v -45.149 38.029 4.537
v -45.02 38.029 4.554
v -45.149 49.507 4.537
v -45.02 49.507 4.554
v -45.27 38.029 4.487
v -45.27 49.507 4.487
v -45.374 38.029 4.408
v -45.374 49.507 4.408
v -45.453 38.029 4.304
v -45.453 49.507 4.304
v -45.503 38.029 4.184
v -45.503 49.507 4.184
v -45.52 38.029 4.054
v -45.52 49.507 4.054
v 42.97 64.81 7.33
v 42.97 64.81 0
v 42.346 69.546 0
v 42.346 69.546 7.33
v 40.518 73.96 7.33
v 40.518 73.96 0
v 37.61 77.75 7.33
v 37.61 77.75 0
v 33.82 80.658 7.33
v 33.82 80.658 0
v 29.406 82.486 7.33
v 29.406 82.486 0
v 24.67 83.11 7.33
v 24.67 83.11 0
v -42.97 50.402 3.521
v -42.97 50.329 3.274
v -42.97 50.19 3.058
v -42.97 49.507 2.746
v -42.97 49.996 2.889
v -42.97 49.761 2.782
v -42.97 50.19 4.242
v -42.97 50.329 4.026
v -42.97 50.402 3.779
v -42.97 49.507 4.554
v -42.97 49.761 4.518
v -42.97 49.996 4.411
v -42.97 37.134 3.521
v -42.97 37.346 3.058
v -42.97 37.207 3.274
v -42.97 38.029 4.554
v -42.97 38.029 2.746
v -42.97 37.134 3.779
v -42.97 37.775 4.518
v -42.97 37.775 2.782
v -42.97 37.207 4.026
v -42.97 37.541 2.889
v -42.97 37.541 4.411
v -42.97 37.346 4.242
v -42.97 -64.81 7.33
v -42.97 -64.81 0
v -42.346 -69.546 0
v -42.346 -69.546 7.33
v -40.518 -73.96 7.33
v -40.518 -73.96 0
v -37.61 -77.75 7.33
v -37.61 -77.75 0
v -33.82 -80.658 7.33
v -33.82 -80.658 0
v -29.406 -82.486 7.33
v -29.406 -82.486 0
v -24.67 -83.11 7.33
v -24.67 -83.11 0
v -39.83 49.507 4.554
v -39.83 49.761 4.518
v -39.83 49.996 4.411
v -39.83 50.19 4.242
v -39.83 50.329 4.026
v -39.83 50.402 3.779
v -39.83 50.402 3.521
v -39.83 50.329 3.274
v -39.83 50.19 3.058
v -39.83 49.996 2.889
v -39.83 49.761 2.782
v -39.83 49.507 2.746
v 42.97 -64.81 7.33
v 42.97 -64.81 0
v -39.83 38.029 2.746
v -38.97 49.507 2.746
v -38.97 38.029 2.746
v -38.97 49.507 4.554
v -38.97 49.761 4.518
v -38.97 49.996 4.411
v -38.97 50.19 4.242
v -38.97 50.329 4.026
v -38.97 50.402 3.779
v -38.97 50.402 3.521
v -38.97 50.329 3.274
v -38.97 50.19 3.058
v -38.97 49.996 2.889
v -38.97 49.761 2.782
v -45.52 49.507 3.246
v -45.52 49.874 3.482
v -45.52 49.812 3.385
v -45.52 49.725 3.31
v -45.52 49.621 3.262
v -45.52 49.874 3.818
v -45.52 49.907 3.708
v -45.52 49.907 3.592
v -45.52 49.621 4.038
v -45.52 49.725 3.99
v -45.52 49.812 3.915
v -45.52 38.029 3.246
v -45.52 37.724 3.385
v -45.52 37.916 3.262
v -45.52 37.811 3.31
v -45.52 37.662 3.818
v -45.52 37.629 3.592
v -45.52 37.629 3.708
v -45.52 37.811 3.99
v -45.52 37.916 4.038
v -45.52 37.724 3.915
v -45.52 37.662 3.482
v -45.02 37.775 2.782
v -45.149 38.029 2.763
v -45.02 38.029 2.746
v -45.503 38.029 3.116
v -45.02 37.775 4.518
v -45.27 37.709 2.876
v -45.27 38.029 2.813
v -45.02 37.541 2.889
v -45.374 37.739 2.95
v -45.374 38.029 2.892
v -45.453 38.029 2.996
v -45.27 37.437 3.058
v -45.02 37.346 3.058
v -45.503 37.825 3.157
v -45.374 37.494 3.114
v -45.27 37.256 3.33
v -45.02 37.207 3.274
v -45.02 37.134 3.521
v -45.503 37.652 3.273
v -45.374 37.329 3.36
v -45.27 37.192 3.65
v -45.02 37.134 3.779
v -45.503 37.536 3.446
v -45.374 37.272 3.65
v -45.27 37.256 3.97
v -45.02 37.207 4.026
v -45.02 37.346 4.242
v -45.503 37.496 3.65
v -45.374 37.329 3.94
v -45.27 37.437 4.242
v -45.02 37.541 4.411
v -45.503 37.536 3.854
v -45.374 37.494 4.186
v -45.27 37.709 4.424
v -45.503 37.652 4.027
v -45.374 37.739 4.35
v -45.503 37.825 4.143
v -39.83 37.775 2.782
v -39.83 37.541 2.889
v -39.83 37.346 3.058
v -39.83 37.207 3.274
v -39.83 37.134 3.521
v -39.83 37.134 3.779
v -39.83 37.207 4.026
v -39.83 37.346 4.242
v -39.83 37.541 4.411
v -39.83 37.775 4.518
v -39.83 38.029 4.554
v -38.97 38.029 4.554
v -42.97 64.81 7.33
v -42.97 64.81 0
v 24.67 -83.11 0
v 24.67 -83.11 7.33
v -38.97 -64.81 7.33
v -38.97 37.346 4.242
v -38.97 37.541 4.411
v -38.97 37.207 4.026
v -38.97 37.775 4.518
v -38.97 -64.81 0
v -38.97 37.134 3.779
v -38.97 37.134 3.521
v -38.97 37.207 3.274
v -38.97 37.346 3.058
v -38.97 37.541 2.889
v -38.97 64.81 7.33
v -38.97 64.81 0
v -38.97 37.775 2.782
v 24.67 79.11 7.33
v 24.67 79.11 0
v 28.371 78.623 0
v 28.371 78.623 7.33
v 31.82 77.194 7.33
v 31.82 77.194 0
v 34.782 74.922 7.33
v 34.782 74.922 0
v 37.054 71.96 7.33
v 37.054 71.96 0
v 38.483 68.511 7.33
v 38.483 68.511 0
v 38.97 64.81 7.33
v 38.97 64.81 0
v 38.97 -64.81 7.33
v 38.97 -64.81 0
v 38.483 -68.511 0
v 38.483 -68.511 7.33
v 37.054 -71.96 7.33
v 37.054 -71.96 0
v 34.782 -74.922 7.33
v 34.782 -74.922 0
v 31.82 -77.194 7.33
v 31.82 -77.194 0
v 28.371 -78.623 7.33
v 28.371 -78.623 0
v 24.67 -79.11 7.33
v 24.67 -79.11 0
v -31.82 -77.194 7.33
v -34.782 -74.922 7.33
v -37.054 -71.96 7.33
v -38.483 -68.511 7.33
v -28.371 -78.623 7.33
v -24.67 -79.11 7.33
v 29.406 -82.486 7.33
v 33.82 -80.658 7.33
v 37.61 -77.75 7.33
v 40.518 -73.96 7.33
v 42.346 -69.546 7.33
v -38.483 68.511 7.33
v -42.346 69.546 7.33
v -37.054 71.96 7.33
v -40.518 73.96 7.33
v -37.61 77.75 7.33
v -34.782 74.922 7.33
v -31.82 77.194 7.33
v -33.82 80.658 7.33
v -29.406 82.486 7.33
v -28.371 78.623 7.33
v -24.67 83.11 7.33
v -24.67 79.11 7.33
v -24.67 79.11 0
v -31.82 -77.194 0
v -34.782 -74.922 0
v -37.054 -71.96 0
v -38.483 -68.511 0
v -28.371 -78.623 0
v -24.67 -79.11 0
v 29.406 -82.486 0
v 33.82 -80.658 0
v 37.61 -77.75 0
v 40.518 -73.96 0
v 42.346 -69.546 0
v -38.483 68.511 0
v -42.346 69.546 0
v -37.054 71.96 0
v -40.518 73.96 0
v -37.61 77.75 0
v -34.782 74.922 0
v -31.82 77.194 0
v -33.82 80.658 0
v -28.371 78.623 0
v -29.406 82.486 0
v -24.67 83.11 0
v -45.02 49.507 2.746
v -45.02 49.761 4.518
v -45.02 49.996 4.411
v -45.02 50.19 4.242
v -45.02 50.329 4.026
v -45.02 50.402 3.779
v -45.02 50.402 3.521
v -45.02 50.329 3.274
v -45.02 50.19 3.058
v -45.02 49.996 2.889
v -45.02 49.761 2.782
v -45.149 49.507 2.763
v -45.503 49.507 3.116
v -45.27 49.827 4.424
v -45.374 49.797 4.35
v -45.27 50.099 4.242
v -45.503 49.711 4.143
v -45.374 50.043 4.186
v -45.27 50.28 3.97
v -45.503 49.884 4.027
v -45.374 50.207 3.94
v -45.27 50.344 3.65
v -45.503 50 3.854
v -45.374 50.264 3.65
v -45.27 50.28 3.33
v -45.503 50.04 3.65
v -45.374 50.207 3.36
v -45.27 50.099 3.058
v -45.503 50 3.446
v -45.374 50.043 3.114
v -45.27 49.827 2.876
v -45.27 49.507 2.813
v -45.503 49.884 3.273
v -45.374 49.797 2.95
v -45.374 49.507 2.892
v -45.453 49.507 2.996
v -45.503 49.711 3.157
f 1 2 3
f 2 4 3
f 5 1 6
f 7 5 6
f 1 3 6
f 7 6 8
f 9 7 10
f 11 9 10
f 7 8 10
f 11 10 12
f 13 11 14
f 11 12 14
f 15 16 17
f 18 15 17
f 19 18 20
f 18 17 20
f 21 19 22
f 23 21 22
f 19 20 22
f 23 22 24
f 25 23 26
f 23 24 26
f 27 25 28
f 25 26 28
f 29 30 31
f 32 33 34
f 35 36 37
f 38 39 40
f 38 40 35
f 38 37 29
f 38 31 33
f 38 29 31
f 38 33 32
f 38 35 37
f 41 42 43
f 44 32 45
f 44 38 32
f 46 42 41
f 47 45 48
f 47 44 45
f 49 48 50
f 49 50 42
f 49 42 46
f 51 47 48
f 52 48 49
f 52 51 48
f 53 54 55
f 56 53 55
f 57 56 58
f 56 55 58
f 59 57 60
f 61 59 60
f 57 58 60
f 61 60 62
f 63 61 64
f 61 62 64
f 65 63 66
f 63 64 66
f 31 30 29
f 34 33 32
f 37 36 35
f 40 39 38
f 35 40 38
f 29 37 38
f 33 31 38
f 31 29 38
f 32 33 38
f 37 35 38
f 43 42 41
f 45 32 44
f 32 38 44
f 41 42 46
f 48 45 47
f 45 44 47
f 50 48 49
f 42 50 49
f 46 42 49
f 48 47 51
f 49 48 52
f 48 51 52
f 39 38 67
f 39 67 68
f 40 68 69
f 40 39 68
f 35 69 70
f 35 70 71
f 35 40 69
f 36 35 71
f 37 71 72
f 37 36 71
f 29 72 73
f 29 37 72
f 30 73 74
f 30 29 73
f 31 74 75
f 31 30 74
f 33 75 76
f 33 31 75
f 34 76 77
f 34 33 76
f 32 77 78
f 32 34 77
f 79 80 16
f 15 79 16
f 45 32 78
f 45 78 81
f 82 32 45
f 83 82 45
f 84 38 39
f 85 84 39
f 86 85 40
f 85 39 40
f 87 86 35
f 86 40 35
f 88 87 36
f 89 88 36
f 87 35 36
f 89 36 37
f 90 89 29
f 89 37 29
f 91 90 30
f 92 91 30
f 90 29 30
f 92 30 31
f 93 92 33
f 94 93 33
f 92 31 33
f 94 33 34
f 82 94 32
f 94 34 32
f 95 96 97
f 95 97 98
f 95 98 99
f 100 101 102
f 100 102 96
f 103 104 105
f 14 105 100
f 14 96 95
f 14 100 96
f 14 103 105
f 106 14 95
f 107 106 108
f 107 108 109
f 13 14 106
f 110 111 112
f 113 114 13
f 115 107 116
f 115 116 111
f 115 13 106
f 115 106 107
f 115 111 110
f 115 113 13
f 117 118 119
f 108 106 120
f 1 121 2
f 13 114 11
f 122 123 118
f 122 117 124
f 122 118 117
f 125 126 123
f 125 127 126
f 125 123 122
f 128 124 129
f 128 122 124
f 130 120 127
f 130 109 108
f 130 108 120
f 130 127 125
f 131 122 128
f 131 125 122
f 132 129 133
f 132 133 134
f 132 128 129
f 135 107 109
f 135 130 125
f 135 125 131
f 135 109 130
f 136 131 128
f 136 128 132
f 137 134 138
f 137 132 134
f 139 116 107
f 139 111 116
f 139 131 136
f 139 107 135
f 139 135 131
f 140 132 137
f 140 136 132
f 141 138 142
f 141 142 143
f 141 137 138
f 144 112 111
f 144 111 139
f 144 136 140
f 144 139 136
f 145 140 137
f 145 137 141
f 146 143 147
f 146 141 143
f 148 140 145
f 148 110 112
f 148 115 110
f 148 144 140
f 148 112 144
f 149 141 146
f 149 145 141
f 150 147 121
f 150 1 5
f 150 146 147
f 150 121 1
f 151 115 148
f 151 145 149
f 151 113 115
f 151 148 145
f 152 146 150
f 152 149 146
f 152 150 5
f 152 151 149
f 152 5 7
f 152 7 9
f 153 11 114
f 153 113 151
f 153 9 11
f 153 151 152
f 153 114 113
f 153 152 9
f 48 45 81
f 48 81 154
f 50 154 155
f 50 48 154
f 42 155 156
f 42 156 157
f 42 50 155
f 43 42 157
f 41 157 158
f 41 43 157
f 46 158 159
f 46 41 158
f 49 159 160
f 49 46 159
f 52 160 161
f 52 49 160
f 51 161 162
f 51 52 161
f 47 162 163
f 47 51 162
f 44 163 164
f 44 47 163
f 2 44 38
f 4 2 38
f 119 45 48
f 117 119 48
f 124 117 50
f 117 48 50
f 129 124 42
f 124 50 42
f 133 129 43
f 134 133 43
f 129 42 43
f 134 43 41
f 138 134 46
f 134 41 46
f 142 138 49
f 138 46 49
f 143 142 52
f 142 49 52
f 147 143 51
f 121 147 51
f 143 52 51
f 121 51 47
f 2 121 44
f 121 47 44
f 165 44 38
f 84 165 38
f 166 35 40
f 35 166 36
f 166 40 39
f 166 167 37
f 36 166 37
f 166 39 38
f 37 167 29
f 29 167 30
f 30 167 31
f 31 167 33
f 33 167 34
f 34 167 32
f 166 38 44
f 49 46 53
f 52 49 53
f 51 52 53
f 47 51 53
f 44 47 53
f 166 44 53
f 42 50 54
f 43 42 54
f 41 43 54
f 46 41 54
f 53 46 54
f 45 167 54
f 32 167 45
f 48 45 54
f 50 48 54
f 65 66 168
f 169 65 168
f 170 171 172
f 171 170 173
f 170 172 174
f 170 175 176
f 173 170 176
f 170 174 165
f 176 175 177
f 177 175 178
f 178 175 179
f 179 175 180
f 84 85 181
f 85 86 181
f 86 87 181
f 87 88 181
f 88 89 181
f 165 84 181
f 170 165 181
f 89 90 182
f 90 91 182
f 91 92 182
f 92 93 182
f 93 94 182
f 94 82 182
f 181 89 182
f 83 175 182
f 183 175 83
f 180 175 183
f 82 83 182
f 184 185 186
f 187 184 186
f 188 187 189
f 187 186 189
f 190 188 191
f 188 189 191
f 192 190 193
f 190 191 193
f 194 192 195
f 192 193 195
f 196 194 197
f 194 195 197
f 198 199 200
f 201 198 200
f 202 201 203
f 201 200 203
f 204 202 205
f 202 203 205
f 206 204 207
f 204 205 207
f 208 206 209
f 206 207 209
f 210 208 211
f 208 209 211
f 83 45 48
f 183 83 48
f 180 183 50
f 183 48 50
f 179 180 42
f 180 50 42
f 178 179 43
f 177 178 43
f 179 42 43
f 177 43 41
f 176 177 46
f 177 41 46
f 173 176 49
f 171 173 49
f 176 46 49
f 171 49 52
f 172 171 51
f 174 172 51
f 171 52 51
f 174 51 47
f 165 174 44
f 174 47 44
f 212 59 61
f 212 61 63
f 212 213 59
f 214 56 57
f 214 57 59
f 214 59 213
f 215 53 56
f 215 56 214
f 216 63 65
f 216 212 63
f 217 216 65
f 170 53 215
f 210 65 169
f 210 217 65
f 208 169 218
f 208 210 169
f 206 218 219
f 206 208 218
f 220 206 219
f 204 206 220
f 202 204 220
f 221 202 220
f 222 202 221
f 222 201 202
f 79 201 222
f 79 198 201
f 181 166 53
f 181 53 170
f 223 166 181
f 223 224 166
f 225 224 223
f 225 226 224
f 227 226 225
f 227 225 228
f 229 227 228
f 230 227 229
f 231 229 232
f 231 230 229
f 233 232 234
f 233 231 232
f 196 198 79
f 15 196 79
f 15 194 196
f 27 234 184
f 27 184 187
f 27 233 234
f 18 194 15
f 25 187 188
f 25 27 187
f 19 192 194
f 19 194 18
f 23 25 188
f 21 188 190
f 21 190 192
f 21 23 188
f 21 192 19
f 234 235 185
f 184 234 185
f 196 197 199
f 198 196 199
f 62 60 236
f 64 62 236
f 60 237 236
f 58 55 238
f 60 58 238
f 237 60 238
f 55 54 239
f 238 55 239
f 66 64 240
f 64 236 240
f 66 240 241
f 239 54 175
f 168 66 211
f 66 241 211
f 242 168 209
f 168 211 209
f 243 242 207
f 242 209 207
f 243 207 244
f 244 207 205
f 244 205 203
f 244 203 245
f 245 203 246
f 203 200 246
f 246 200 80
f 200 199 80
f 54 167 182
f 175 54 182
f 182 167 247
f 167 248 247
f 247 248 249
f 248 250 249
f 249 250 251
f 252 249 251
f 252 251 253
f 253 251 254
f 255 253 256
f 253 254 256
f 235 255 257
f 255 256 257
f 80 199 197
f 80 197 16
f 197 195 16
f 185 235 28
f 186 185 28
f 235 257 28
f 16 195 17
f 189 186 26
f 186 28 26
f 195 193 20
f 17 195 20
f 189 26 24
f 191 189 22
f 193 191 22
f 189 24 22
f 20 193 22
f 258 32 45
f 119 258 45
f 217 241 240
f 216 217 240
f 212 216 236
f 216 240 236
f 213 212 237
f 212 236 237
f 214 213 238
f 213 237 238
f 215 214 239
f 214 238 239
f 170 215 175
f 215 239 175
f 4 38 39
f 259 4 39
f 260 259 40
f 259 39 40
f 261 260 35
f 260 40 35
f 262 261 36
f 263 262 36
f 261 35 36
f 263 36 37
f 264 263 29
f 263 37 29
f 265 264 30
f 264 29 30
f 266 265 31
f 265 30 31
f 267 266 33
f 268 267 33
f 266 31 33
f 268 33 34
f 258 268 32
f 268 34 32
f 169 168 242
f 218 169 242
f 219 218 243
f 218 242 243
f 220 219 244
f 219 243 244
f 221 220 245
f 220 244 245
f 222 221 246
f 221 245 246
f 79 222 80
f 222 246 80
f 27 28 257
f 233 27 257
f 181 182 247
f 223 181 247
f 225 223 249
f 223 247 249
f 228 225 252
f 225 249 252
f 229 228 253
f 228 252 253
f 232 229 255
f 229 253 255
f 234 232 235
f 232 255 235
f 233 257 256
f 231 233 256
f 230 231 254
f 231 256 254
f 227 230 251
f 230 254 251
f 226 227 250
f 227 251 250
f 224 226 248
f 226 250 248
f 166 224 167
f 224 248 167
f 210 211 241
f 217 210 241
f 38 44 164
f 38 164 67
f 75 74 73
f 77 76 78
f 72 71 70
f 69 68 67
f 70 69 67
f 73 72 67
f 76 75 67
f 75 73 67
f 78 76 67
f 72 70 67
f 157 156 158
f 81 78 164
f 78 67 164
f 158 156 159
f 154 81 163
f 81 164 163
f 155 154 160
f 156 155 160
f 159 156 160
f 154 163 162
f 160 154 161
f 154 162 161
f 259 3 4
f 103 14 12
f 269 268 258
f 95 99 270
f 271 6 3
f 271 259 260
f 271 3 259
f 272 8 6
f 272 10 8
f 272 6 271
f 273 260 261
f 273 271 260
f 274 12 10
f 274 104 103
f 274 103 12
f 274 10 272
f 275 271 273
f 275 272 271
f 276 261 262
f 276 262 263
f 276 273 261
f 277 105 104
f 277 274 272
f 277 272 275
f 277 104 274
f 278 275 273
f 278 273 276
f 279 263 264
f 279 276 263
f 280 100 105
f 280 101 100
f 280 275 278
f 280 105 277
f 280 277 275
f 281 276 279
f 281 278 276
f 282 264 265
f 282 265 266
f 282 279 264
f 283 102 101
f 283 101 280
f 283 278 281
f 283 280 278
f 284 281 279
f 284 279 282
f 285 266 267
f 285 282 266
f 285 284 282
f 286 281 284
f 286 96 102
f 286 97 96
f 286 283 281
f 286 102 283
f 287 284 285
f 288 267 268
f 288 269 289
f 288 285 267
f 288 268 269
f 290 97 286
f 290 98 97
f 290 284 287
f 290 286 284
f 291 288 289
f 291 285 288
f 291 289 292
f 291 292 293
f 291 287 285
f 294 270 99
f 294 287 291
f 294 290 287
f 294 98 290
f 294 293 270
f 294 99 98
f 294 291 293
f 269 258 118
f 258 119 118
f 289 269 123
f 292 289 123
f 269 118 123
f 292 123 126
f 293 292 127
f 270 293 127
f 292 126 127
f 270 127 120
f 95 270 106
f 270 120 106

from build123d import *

# Parameters (mm, degrees)
F1_DEPTH = 7.33
F4_DEPTH = 2.55
F5_R     = 0.5
F6_DEPTH = 5
F7_DEPTH = 3.14


with BuildPart() as f1:
    # F0 (on Top) → F1 (new body)
    with BuildSketch(Plane.XY):
        with BuildLine():
            Line((-42.9700019847, 64.81), (-42.9700019847, 43.63))
            Line((-42.9700019847, 43.63), (-42.9700019847, -64.81))
            ThreePointArc((-42.9700019847, -64.81), (-37.6100554991, -77.7500554991), (-24.67, -83.1100019847))
            Line((-24.67, -83.1100019847), (24.67, -83.1100019847))
            ThreePointArc((24.67, -83.1100019847), (37.6100554991, -77.7500554991), (42.9700019847, -64.81))
            Line((42.9700019847, -64.81), (42.9700019847, 64.81))
            ThreePointArc((42.9700019847, 64.81), (37.6100554991, 77.7500554991), (24.67, 83.1100019847))
            Line((24.67, 83.1100019847), (-24.67, 83.1100019847))
            ThreePointArc((-24.67, 83.1100019847), (-37.6100554991, 77.7500554991), (-42.9700019847, 64.81))
        make_face()
        with BuildLine():
            ThreePointArc((-38.97, 64.81), (-34.781626971, 74.921626971), (-24.67, 79.11))
            Line((-24.67, 79.11), (-17.5395198166, 79.11))
            Line((-17.5395198166, 79.11), (24.67, 79.11))
            ThreePointArc((24.67, 79.11), (34.781626971, 74.921626971), (38.97, 64.81))
            Line((38.97, 64.81), (38.97, -64.81))
            ThreePointArc((38.97, -64.81), (34.781626971, -74.921626971), (24.67, -79.11))
            Line((24.67, -79.11), (-24.67, -79.11))
            ThreePointArc((-24.67, -79.11), (-34.781626971, -74.921626971), (-38.97, -64.81))
            Line((-38.97, -64.81), (-38.97, 43.63))
            Line((-38.97, 43.63), (-38.97, 64.81))
        make_face(mode=Mode.SUBTRACT)
    extrude(amount=F1_DEPTH)

    # F3 (on offset) → F4 (join)
    with BuildSketch(Plane(origin=(-42.9700019847, 0, 0), x_dir=(0, -1, 0), z_dir=(-1, 0, 0))):
        with BuildLine():
            Line((-49.506586045, 2.7456503123), (-43.7680147588, 2.7456503123))
            Line((-43.7680147588, 2.7456503123), (-38.0294434726, 2.7456503123))
            ThreePointArc((-38.0294434726, 2.7456503123), (-37.1250937849, 3.65), (-38.0294434726, 4.5543496877))
            Line((-38.0294434726, 4.5543496877), (-43.7680147588, 4.5543496877))
            Line((-43.7680147588, 4.5543496877), (-49.506586045, 4.5543496877))
            ThreePointArc((-49.506586045, 4.5543496877), (-50.4109357327, 3.65), (-49.506586045, 2.7456503123))
        make_face()
    extrude(amount=F4_DEPTH)

    # F5
    f5_edges = [f1.edges().sort_by_distance(p)[0] for p in [
        (-45.520002, 43.768015, 2.74565),
        (-45.520002, 43.768015, 4.55435),
        (-45.520002, 37.125094, 3.65),
        (-45.520002, 50.410936, 3.65),
    ]]
    fillet(f5_edges, radius=F5_R)

    # F3 (on offset) → F6 (cut)
    with BuildSketch(Plane(origin=(-42.9700019847, 0, 0), x_dir=(0, -1, 0), z_dir=(-1, 0, 0))):
        with BuildLine():
            Line((-49.506586045, 2.7456503123), (-43.7680147588, 2.7456503123))
            Line((-43.7680147588, 2.7456503123), (-38.0294434726, 2.7456503123))
            ThreePointArc((-38.0294434726, 2.7456503123), (-37.1250937849, 3.65), (-38.0294434726, 4.5543496877))
            Line((-38.0294434726, 4.5543496877), (-43.7680147588, 4.5543496877))
            Line((-43.7680147588, 4.5543496877), (-49.506586045, 4.5543496877))
            ThreePointArc((-49.506586045, 4.5543496877), (-50.4109357327, 3.65), (-49.506586045, 2.7456503123))
        make_face()
    extrude(amount=-F6_DEPTH, mode=Mode.SUBTRACT)


with BuildPart() as f7:
    # F7 (new): a face of the model
    f7_faces = [f1.part.faces().sort_by_distance(p)[0] for p in [
        (-42.9700019847, 43.7680147588, 3.65),
    ]]
    extrude(f7_faces, amount=F7_DEPTH)


solid = Compound([f1.part, f7.part])
